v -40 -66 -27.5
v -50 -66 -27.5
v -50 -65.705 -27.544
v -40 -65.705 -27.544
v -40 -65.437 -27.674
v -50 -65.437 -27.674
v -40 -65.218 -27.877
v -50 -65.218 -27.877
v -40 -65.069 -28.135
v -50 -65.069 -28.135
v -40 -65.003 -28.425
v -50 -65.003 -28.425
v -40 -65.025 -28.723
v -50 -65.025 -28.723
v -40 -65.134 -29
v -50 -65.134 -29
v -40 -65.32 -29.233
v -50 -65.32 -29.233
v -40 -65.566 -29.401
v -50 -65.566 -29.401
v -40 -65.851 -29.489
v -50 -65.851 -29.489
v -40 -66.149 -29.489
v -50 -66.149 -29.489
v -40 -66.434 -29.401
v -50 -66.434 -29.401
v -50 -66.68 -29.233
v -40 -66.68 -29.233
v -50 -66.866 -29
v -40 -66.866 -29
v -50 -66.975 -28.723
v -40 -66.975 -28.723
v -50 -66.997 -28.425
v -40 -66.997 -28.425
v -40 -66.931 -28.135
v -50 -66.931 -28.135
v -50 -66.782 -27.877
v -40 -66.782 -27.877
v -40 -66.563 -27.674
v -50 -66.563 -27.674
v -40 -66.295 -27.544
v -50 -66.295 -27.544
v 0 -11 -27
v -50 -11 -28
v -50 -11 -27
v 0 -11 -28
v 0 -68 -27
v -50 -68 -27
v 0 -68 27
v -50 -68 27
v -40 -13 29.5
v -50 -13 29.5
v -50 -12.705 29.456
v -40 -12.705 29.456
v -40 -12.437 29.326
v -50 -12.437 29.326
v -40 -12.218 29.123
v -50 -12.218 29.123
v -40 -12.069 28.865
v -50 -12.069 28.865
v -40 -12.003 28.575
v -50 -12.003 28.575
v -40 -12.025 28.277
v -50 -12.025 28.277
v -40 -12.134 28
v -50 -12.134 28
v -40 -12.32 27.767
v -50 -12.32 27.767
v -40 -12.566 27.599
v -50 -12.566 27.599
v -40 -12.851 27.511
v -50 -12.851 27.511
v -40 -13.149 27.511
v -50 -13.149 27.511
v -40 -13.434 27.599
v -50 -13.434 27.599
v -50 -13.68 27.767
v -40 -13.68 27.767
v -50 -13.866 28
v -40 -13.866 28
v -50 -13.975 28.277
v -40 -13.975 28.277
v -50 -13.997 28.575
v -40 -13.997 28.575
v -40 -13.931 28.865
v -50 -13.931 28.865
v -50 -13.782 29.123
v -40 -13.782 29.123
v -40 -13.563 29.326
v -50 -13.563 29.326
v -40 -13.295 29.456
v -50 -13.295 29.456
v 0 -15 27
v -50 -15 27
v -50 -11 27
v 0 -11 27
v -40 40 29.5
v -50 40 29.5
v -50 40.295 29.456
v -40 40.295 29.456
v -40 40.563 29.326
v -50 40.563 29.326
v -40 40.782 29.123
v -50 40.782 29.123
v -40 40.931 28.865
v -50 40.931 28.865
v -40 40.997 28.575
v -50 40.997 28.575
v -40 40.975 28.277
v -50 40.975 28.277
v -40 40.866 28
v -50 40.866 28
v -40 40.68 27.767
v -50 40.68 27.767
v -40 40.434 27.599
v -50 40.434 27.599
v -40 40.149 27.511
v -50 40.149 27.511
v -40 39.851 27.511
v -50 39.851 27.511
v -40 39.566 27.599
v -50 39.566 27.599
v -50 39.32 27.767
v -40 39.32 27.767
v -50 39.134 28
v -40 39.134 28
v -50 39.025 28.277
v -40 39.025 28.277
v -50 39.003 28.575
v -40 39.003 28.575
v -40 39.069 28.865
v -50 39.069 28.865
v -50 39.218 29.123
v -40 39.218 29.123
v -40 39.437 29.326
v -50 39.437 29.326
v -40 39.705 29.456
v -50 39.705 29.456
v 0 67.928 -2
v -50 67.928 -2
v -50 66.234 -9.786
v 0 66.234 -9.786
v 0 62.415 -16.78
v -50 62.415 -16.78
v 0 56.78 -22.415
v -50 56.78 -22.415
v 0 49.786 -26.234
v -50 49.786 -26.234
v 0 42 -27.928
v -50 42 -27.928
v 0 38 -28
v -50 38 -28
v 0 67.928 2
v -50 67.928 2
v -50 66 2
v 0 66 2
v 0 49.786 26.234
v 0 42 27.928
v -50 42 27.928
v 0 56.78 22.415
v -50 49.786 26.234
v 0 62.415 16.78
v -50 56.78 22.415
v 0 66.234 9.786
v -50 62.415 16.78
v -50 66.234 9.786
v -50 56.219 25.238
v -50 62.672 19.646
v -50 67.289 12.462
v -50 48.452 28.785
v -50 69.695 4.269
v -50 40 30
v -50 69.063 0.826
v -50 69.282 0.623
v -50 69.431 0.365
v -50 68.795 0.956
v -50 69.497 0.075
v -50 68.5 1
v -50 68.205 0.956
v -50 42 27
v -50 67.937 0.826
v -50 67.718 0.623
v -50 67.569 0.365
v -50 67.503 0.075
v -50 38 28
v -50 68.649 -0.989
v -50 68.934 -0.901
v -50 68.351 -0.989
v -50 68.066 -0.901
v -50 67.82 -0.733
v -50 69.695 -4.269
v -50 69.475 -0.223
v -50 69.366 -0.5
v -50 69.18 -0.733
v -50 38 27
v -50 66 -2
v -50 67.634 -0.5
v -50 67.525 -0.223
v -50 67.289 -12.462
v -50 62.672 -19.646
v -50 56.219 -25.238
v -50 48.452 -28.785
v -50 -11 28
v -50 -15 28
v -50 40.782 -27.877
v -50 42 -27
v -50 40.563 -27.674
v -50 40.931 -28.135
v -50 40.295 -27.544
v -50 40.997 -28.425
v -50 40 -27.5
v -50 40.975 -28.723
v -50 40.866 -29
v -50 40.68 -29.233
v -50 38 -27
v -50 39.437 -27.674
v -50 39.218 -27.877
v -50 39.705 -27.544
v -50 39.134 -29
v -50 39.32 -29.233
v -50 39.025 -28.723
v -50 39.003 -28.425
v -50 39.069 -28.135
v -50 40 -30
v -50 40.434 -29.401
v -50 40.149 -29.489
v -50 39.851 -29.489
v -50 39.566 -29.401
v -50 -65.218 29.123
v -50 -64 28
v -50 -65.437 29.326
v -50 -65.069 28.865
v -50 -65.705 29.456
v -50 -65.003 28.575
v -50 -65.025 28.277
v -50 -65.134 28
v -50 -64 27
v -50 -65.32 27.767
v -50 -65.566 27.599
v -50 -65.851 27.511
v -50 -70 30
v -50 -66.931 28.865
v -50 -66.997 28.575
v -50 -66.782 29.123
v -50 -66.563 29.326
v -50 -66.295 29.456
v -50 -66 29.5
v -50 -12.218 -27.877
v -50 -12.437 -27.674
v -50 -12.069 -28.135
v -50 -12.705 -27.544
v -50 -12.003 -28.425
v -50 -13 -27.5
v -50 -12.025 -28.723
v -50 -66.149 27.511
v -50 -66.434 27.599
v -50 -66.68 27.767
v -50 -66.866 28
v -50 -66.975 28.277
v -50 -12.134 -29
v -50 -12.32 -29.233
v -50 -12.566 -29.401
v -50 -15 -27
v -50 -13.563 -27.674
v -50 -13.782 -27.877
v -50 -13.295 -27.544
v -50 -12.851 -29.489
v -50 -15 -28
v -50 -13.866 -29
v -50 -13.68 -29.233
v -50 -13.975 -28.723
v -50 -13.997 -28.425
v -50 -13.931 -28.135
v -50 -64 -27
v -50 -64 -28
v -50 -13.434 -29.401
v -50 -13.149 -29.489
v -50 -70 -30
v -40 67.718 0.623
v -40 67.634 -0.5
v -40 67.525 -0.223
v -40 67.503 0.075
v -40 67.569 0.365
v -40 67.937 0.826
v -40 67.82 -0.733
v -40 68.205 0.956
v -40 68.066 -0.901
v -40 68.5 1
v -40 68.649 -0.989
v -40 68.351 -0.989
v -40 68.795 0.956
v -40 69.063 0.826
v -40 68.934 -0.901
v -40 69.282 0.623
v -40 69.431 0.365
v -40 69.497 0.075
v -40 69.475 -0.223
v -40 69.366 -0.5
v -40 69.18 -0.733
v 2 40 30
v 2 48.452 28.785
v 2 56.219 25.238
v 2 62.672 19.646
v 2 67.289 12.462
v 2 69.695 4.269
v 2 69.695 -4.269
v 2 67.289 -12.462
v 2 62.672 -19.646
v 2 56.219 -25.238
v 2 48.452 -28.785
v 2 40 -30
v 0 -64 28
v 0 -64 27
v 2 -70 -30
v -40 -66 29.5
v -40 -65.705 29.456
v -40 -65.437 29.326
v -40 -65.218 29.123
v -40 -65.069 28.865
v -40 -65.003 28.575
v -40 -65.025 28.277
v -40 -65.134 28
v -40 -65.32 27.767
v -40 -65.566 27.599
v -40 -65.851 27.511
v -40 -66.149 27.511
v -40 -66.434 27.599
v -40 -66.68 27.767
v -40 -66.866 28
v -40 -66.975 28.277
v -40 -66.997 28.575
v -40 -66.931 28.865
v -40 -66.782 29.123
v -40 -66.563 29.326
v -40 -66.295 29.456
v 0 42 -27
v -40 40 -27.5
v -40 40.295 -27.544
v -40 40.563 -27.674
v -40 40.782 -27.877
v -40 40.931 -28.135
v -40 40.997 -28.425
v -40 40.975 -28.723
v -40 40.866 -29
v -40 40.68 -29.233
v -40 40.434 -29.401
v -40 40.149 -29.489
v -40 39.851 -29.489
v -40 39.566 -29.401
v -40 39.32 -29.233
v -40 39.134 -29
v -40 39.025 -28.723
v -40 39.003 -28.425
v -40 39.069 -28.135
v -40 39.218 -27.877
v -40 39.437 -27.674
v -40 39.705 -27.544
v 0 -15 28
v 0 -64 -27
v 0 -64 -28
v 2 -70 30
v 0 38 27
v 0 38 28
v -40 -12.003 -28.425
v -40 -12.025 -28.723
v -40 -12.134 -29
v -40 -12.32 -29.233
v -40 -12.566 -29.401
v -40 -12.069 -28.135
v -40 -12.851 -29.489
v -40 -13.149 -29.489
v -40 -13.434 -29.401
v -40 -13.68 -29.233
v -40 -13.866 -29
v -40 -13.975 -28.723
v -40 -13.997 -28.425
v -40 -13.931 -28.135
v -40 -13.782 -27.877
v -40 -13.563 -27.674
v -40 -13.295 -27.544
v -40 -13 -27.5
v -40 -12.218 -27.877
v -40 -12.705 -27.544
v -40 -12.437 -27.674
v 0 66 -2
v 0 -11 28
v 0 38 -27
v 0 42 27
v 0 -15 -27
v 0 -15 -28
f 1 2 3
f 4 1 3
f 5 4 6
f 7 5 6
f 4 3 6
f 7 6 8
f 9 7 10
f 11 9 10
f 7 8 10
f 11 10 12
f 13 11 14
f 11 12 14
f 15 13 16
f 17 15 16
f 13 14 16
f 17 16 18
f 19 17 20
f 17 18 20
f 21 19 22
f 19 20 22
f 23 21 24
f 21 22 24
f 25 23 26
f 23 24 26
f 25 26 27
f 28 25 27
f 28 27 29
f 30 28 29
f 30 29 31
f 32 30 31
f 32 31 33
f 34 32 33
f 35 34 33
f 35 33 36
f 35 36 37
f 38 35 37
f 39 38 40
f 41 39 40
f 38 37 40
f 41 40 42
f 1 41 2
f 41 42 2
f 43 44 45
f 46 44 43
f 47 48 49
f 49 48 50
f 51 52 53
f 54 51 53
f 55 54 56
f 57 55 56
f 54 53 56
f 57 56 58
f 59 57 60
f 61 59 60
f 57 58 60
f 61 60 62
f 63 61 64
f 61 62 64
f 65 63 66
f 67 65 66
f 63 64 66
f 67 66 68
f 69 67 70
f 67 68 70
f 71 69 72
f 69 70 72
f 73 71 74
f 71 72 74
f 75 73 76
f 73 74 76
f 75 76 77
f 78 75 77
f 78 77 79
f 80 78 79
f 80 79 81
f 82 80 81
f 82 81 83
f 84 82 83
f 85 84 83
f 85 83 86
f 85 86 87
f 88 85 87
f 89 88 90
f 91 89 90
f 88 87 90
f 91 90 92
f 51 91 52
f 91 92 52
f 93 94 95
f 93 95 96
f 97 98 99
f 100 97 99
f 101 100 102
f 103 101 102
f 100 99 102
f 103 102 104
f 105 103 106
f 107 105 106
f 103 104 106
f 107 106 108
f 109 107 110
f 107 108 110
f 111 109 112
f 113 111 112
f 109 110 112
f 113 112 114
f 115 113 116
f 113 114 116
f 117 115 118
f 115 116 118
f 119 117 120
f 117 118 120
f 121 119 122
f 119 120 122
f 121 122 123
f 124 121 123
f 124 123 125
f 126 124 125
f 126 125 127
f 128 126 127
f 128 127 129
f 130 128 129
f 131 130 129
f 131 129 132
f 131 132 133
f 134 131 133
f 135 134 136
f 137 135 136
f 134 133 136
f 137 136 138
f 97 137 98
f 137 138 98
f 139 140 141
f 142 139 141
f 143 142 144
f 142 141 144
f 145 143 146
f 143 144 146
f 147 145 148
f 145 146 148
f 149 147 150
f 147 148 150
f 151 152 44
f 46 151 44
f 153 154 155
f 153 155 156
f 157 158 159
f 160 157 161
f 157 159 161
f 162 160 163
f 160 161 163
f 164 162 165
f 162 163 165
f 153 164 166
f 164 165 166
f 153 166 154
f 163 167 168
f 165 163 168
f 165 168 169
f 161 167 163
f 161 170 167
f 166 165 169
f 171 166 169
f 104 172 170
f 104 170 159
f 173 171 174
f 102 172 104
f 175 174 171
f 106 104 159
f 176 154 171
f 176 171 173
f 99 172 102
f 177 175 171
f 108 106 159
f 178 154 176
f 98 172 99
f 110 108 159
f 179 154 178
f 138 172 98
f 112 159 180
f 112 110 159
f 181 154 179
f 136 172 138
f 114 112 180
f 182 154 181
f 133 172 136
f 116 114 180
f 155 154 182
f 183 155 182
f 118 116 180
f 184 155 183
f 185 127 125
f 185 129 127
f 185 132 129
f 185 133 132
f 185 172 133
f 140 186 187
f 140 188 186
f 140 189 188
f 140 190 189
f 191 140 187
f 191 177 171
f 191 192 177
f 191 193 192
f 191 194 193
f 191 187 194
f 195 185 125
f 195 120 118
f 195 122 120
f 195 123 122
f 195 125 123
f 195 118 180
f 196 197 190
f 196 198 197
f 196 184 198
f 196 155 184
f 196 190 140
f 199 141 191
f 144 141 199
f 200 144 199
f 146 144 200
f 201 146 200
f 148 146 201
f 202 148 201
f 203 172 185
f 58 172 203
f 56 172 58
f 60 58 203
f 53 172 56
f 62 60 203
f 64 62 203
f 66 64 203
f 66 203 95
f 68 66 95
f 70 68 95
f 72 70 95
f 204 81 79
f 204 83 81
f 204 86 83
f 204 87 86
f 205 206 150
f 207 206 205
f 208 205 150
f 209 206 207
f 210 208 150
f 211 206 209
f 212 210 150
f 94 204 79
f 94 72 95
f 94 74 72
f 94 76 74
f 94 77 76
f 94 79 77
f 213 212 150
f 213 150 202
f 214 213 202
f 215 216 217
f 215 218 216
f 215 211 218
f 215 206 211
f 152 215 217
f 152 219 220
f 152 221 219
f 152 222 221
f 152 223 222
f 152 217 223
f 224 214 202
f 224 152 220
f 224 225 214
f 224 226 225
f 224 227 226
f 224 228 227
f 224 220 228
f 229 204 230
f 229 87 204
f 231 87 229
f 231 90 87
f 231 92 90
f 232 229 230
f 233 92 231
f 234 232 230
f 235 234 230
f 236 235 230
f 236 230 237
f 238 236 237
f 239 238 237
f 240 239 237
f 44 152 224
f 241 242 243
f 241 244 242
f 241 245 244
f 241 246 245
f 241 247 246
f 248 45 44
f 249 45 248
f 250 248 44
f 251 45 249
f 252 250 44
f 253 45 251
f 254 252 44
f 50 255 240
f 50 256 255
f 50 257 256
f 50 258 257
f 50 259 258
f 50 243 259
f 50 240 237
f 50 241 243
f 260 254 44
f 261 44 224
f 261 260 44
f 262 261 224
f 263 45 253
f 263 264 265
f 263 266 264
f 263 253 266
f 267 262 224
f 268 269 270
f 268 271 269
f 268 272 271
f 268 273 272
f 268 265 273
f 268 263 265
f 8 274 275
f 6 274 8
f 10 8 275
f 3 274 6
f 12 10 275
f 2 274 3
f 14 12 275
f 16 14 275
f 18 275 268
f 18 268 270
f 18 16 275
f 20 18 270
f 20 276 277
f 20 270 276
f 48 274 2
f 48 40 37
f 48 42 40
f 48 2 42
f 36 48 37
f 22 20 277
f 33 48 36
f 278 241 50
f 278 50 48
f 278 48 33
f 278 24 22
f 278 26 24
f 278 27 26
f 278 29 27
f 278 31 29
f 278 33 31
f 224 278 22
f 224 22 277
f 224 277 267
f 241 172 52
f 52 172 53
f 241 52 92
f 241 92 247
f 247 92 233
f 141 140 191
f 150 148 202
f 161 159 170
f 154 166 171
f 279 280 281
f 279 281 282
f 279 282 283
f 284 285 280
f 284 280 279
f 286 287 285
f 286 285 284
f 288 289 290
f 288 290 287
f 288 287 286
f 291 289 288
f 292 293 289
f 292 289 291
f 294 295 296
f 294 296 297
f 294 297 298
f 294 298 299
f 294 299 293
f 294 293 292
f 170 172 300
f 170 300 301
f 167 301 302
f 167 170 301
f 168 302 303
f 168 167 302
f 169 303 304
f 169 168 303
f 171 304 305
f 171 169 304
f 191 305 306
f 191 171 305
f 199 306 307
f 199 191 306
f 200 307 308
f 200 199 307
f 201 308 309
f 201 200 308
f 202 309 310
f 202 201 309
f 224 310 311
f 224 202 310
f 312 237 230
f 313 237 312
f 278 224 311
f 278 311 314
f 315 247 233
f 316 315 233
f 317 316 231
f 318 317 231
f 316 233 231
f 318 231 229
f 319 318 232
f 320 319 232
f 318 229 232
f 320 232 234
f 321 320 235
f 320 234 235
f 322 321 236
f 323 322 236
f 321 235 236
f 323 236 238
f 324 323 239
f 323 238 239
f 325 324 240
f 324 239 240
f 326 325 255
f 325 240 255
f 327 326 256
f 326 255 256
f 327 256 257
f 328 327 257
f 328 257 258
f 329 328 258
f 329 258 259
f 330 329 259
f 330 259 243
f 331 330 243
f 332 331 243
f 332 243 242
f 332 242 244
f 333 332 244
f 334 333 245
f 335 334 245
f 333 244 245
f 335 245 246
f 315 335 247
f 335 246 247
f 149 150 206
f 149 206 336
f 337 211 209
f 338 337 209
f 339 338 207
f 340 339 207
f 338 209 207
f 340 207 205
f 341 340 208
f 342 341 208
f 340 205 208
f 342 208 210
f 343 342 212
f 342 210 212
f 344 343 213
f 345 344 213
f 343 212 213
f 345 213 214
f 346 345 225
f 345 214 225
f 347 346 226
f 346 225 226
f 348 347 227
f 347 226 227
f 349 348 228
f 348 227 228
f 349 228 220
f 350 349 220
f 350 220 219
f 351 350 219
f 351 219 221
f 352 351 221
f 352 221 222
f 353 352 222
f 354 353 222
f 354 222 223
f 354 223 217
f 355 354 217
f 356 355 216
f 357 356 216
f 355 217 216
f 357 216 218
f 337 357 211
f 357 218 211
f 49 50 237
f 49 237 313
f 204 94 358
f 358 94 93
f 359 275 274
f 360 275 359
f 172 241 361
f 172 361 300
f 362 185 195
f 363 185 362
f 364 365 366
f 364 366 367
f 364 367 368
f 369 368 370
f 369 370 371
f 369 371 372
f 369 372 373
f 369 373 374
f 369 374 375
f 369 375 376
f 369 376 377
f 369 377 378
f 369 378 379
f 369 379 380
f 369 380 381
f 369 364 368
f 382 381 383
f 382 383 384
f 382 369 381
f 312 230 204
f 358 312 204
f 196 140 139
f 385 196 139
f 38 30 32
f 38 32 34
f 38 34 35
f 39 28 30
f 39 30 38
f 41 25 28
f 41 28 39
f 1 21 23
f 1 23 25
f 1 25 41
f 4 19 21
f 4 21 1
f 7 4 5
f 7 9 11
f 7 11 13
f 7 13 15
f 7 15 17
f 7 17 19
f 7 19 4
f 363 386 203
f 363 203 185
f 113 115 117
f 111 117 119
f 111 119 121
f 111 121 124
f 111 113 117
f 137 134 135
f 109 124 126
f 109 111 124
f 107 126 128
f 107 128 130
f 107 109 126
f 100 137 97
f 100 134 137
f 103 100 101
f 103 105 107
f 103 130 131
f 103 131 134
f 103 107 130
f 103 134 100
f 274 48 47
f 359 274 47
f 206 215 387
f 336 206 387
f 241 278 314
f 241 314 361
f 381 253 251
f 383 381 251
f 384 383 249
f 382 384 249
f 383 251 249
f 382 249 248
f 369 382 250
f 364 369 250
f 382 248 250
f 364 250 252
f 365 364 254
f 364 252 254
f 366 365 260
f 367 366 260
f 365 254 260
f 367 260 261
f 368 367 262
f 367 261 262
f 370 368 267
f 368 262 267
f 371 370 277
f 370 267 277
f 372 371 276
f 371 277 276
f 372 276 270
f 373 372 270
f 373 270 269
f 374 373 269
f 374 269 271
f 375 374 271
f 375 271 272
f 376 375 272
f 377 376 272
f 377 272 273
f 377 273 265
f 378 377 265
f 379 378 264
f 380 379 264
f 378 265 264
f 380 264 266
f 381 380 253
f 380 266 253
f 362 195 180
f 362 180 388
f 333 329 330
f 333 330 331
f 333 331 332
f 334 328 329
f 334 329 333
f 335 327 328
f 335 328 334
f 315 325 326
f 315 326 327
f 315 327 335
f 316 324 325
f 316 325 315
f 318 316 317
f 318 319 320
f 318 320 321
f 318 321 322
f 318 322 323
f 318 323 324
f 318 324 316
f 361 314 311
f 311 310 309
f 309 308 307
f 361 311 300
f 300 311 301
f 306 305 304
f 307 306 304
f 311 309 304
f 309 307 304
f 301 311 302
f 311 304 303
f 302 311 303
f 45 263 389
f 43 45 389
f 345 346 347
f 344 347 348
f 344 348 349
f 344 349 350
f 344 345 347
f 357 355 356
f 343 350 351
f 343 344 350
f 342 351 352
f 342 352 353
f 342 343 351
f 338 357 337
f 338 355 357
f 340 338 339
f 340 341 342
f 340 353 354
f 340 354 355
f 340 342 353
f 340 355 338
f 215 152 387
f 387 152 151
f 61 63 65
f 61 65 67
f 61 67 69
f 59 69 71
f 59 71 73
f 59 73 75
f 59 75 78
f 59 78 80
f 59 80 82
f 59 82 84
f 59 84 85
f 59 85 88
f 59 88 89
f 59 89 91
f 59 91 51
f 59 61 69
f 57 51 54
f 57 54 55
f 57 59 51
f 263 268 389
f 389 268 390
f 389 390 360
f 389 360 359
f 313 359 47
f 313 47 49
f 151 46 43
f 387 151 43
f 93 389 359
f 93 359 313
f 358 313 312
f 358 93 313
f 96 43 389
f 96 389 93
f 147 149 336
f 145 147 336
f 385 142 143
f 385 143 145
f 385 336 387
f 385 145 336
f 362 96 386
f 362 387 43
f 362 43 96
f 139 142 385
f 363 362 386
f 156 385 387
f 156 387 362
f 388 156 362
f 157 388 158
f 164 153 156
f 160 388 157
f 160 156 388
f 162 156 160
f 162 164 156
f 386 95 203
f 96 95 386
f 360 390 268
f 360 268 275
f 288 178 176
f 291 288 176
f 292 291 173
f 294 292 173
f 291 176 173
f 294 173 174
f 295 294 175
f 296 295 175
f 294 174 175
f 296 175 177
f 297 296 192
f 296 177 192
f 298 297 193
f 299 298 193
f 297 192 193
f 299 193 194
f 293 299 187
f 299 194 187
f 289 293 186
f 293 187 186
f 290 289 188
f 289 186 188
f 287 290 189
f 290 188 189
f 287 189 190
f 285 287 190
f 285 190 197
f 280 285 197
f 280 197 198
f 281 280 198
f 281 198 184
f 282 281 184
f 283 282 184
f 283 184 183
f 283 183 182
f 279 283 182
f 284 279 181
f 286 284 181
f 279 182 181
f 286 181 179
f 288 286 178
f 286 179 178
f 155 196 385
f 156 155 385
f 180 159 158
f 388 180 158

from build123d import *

# Parameters (mm, degrees)
BOSS_EXTRUDE1_DEPTH     = 2
EXTRUDE_THIN2_START     = 50
EXTRUDE_THIN2_DEPTH     = 50
RIB2_START              = -2
RIB2_OUTLINE_W          = 51
RIB2_OUTLINE_H          = 3
RIB2_DEPTH              = 4
RIB14_START             = -2
RIB14_OUTLINE_W         = 50
RIB14_OUTLINE_H         = 1
RIB14_DEPTH             = 4
LPATTERN1_COUNT         = 3
LPATTERN1_PITCH         = 53
MIRROR1_START           = -2
MIRROR1_COPY_1_SKETCH_W = 50
MIRROR1_COPY_1_SKETCH_H = 1
MIRROR1_COPY_1_DEPTH    = 4
MIRROR1_COPY_2_SKETCH_W = 50
MIRROR1_COPY_2_SKETCH_H = 1
MIRROR1_COPY_2_DEPTH    = 4
SKETCH6_R               = 1
CUT_EXTRUDE1_DEPTH      = 10


# Read off the part's stored shape, not the designer's step: Rib2, Rib14
with BuildPart() as part:
    # Sketch2 → Boss-Extrude1 (new body)
    with BuildSketch(Plane(origin=(0, 0, 0), x_dir=(0, 0, -1), z_dir=(1, 0, 0))):
        with BuildLine():
            Line((30, -70), (-30, -70))
            Line((-30, -70), (-30, 40))
            ThreePointArc((-30, 40), (0, 70), (30, 40))
            Line((30, 40), (30, -70))
        make_face()
    extrude(amount=BOSS_EXTRUDE1_DEPTH)

    # Sketch5 → Extrude-Thin2 (add)
    with BuildSketch(Plane.ZY.offset(EXTRUDE_THIN2_START)):
        with BuildLine():
            Line((-30, 40), (-30, -70))
            Line((-30, -70), (30, -70))
            Line((30, -70), (30, 40))
            ThreePointArc((30, 40), (0, 70), (-30, 40))
        make_face()
        with BuildLine():
            Line((-28, 40), (-28, -68))
            Line((-28, -68), (28, -68))
            Line((28, -68), (28, 40))
            ThreePointArc((28, 40), (0, 68), (-28, 40))
        make_face(mode=Mode.SUBTRACT)
    extrude(amount=-EXTRUDE_THIN2_DEPTH)

    # Rib2 outline → Rib2 (add)
    with BuildSketch(Plane.XY.offset(RIB2_START)):
        with Locations((-24.5, 67.5)):
            Rectangle(RIB2_OUTLINE_W, RIB2_OUTLINE_H)
    extrude(amount=RIB2_DEPTH)

    # Rib14 outline → Rib14 (add)
    with BuildSketch(Plane(origin=(0, 40, 0), x_dir=(1, 0, 0), z_dir=(0, 1, 0)).offset(RIB14_START)):
        with Locations((-25, 27.5)):
            Rectangle(RIB14_OUTLINE_W, RIB14_OUTLINE_H)
    rib14 = extrude(amount=RIB14_DEPTH)

    # LPattern1: Rib14 ×3
    with Locations(*[(0, -i * LPATTERN1_PITCH, 0) for i in range(1, LPATTERN1_COUNT)]):
        add(rib14)

    # Mirror1: Rib14 across plane
    add(rib14.mirror(Plane.XY))

    # Mirror1 copy 1 sketch → Mirror1 copy 1 (add)
    with BuildSketch(Plane(origin=(0, -13, 0), x_dir=(1, 0, 0), z_dir=(0, 1, 0)).offset(MIRROR1_START)):
        with Locations((-25, -27.5)):
            Rectangle(MIRROR1_COPY_1_SKETCH_W, MIRROR1_COPY_1_SKETCH_H)
    extrude(amount=MIRROR1_COPY_1_DEPTH)

    # Mirror1 copy 2 sketch → Mirror1 copy 2 (add)
    with BuildSketch(Plane(origin=(0, -66, 0), x_dir=(1, 0, 0), z_dir=(0, 1, 0)).offset(MIRROR1_START)):
        with Locations((-25, -27.5)):
            Rectangle(MIRROR1_COPY_2_SKETCH_W, MIRROR1_COPY_2_SKETCH_H)
    extrude(amount=MIRROR1_COPY_2_DEPTH)

    # Sketch6 → Cut-Extrude1 (cut)
    with BuildSketch(Plane.ZY.offset(50)):
        with Locations((0, 68.5)):
            Circle(SKETCH6_R)
        with Locations((-28.5, 40)):
            Circle(SKETCH6_R)
        with Locations((28.5, 40)):
            Circle(SKETCH6_R)
        with Locations((28.5, -13)):
            Circle(SKETCH6_R)
        with Locations((28.5, -66)):
            Circle(SKETCH6_R)
        with Locations((-28.5, -13)):
            Circle(SKETCH6_R)
        with Locations((-28.5, -66)):
            Circle(SKETCH6_R)
    extrude(amount=-CUT_EXTRUDE1_DEPTH, mode=Mode.SUBTRACT)


solid = part.part
